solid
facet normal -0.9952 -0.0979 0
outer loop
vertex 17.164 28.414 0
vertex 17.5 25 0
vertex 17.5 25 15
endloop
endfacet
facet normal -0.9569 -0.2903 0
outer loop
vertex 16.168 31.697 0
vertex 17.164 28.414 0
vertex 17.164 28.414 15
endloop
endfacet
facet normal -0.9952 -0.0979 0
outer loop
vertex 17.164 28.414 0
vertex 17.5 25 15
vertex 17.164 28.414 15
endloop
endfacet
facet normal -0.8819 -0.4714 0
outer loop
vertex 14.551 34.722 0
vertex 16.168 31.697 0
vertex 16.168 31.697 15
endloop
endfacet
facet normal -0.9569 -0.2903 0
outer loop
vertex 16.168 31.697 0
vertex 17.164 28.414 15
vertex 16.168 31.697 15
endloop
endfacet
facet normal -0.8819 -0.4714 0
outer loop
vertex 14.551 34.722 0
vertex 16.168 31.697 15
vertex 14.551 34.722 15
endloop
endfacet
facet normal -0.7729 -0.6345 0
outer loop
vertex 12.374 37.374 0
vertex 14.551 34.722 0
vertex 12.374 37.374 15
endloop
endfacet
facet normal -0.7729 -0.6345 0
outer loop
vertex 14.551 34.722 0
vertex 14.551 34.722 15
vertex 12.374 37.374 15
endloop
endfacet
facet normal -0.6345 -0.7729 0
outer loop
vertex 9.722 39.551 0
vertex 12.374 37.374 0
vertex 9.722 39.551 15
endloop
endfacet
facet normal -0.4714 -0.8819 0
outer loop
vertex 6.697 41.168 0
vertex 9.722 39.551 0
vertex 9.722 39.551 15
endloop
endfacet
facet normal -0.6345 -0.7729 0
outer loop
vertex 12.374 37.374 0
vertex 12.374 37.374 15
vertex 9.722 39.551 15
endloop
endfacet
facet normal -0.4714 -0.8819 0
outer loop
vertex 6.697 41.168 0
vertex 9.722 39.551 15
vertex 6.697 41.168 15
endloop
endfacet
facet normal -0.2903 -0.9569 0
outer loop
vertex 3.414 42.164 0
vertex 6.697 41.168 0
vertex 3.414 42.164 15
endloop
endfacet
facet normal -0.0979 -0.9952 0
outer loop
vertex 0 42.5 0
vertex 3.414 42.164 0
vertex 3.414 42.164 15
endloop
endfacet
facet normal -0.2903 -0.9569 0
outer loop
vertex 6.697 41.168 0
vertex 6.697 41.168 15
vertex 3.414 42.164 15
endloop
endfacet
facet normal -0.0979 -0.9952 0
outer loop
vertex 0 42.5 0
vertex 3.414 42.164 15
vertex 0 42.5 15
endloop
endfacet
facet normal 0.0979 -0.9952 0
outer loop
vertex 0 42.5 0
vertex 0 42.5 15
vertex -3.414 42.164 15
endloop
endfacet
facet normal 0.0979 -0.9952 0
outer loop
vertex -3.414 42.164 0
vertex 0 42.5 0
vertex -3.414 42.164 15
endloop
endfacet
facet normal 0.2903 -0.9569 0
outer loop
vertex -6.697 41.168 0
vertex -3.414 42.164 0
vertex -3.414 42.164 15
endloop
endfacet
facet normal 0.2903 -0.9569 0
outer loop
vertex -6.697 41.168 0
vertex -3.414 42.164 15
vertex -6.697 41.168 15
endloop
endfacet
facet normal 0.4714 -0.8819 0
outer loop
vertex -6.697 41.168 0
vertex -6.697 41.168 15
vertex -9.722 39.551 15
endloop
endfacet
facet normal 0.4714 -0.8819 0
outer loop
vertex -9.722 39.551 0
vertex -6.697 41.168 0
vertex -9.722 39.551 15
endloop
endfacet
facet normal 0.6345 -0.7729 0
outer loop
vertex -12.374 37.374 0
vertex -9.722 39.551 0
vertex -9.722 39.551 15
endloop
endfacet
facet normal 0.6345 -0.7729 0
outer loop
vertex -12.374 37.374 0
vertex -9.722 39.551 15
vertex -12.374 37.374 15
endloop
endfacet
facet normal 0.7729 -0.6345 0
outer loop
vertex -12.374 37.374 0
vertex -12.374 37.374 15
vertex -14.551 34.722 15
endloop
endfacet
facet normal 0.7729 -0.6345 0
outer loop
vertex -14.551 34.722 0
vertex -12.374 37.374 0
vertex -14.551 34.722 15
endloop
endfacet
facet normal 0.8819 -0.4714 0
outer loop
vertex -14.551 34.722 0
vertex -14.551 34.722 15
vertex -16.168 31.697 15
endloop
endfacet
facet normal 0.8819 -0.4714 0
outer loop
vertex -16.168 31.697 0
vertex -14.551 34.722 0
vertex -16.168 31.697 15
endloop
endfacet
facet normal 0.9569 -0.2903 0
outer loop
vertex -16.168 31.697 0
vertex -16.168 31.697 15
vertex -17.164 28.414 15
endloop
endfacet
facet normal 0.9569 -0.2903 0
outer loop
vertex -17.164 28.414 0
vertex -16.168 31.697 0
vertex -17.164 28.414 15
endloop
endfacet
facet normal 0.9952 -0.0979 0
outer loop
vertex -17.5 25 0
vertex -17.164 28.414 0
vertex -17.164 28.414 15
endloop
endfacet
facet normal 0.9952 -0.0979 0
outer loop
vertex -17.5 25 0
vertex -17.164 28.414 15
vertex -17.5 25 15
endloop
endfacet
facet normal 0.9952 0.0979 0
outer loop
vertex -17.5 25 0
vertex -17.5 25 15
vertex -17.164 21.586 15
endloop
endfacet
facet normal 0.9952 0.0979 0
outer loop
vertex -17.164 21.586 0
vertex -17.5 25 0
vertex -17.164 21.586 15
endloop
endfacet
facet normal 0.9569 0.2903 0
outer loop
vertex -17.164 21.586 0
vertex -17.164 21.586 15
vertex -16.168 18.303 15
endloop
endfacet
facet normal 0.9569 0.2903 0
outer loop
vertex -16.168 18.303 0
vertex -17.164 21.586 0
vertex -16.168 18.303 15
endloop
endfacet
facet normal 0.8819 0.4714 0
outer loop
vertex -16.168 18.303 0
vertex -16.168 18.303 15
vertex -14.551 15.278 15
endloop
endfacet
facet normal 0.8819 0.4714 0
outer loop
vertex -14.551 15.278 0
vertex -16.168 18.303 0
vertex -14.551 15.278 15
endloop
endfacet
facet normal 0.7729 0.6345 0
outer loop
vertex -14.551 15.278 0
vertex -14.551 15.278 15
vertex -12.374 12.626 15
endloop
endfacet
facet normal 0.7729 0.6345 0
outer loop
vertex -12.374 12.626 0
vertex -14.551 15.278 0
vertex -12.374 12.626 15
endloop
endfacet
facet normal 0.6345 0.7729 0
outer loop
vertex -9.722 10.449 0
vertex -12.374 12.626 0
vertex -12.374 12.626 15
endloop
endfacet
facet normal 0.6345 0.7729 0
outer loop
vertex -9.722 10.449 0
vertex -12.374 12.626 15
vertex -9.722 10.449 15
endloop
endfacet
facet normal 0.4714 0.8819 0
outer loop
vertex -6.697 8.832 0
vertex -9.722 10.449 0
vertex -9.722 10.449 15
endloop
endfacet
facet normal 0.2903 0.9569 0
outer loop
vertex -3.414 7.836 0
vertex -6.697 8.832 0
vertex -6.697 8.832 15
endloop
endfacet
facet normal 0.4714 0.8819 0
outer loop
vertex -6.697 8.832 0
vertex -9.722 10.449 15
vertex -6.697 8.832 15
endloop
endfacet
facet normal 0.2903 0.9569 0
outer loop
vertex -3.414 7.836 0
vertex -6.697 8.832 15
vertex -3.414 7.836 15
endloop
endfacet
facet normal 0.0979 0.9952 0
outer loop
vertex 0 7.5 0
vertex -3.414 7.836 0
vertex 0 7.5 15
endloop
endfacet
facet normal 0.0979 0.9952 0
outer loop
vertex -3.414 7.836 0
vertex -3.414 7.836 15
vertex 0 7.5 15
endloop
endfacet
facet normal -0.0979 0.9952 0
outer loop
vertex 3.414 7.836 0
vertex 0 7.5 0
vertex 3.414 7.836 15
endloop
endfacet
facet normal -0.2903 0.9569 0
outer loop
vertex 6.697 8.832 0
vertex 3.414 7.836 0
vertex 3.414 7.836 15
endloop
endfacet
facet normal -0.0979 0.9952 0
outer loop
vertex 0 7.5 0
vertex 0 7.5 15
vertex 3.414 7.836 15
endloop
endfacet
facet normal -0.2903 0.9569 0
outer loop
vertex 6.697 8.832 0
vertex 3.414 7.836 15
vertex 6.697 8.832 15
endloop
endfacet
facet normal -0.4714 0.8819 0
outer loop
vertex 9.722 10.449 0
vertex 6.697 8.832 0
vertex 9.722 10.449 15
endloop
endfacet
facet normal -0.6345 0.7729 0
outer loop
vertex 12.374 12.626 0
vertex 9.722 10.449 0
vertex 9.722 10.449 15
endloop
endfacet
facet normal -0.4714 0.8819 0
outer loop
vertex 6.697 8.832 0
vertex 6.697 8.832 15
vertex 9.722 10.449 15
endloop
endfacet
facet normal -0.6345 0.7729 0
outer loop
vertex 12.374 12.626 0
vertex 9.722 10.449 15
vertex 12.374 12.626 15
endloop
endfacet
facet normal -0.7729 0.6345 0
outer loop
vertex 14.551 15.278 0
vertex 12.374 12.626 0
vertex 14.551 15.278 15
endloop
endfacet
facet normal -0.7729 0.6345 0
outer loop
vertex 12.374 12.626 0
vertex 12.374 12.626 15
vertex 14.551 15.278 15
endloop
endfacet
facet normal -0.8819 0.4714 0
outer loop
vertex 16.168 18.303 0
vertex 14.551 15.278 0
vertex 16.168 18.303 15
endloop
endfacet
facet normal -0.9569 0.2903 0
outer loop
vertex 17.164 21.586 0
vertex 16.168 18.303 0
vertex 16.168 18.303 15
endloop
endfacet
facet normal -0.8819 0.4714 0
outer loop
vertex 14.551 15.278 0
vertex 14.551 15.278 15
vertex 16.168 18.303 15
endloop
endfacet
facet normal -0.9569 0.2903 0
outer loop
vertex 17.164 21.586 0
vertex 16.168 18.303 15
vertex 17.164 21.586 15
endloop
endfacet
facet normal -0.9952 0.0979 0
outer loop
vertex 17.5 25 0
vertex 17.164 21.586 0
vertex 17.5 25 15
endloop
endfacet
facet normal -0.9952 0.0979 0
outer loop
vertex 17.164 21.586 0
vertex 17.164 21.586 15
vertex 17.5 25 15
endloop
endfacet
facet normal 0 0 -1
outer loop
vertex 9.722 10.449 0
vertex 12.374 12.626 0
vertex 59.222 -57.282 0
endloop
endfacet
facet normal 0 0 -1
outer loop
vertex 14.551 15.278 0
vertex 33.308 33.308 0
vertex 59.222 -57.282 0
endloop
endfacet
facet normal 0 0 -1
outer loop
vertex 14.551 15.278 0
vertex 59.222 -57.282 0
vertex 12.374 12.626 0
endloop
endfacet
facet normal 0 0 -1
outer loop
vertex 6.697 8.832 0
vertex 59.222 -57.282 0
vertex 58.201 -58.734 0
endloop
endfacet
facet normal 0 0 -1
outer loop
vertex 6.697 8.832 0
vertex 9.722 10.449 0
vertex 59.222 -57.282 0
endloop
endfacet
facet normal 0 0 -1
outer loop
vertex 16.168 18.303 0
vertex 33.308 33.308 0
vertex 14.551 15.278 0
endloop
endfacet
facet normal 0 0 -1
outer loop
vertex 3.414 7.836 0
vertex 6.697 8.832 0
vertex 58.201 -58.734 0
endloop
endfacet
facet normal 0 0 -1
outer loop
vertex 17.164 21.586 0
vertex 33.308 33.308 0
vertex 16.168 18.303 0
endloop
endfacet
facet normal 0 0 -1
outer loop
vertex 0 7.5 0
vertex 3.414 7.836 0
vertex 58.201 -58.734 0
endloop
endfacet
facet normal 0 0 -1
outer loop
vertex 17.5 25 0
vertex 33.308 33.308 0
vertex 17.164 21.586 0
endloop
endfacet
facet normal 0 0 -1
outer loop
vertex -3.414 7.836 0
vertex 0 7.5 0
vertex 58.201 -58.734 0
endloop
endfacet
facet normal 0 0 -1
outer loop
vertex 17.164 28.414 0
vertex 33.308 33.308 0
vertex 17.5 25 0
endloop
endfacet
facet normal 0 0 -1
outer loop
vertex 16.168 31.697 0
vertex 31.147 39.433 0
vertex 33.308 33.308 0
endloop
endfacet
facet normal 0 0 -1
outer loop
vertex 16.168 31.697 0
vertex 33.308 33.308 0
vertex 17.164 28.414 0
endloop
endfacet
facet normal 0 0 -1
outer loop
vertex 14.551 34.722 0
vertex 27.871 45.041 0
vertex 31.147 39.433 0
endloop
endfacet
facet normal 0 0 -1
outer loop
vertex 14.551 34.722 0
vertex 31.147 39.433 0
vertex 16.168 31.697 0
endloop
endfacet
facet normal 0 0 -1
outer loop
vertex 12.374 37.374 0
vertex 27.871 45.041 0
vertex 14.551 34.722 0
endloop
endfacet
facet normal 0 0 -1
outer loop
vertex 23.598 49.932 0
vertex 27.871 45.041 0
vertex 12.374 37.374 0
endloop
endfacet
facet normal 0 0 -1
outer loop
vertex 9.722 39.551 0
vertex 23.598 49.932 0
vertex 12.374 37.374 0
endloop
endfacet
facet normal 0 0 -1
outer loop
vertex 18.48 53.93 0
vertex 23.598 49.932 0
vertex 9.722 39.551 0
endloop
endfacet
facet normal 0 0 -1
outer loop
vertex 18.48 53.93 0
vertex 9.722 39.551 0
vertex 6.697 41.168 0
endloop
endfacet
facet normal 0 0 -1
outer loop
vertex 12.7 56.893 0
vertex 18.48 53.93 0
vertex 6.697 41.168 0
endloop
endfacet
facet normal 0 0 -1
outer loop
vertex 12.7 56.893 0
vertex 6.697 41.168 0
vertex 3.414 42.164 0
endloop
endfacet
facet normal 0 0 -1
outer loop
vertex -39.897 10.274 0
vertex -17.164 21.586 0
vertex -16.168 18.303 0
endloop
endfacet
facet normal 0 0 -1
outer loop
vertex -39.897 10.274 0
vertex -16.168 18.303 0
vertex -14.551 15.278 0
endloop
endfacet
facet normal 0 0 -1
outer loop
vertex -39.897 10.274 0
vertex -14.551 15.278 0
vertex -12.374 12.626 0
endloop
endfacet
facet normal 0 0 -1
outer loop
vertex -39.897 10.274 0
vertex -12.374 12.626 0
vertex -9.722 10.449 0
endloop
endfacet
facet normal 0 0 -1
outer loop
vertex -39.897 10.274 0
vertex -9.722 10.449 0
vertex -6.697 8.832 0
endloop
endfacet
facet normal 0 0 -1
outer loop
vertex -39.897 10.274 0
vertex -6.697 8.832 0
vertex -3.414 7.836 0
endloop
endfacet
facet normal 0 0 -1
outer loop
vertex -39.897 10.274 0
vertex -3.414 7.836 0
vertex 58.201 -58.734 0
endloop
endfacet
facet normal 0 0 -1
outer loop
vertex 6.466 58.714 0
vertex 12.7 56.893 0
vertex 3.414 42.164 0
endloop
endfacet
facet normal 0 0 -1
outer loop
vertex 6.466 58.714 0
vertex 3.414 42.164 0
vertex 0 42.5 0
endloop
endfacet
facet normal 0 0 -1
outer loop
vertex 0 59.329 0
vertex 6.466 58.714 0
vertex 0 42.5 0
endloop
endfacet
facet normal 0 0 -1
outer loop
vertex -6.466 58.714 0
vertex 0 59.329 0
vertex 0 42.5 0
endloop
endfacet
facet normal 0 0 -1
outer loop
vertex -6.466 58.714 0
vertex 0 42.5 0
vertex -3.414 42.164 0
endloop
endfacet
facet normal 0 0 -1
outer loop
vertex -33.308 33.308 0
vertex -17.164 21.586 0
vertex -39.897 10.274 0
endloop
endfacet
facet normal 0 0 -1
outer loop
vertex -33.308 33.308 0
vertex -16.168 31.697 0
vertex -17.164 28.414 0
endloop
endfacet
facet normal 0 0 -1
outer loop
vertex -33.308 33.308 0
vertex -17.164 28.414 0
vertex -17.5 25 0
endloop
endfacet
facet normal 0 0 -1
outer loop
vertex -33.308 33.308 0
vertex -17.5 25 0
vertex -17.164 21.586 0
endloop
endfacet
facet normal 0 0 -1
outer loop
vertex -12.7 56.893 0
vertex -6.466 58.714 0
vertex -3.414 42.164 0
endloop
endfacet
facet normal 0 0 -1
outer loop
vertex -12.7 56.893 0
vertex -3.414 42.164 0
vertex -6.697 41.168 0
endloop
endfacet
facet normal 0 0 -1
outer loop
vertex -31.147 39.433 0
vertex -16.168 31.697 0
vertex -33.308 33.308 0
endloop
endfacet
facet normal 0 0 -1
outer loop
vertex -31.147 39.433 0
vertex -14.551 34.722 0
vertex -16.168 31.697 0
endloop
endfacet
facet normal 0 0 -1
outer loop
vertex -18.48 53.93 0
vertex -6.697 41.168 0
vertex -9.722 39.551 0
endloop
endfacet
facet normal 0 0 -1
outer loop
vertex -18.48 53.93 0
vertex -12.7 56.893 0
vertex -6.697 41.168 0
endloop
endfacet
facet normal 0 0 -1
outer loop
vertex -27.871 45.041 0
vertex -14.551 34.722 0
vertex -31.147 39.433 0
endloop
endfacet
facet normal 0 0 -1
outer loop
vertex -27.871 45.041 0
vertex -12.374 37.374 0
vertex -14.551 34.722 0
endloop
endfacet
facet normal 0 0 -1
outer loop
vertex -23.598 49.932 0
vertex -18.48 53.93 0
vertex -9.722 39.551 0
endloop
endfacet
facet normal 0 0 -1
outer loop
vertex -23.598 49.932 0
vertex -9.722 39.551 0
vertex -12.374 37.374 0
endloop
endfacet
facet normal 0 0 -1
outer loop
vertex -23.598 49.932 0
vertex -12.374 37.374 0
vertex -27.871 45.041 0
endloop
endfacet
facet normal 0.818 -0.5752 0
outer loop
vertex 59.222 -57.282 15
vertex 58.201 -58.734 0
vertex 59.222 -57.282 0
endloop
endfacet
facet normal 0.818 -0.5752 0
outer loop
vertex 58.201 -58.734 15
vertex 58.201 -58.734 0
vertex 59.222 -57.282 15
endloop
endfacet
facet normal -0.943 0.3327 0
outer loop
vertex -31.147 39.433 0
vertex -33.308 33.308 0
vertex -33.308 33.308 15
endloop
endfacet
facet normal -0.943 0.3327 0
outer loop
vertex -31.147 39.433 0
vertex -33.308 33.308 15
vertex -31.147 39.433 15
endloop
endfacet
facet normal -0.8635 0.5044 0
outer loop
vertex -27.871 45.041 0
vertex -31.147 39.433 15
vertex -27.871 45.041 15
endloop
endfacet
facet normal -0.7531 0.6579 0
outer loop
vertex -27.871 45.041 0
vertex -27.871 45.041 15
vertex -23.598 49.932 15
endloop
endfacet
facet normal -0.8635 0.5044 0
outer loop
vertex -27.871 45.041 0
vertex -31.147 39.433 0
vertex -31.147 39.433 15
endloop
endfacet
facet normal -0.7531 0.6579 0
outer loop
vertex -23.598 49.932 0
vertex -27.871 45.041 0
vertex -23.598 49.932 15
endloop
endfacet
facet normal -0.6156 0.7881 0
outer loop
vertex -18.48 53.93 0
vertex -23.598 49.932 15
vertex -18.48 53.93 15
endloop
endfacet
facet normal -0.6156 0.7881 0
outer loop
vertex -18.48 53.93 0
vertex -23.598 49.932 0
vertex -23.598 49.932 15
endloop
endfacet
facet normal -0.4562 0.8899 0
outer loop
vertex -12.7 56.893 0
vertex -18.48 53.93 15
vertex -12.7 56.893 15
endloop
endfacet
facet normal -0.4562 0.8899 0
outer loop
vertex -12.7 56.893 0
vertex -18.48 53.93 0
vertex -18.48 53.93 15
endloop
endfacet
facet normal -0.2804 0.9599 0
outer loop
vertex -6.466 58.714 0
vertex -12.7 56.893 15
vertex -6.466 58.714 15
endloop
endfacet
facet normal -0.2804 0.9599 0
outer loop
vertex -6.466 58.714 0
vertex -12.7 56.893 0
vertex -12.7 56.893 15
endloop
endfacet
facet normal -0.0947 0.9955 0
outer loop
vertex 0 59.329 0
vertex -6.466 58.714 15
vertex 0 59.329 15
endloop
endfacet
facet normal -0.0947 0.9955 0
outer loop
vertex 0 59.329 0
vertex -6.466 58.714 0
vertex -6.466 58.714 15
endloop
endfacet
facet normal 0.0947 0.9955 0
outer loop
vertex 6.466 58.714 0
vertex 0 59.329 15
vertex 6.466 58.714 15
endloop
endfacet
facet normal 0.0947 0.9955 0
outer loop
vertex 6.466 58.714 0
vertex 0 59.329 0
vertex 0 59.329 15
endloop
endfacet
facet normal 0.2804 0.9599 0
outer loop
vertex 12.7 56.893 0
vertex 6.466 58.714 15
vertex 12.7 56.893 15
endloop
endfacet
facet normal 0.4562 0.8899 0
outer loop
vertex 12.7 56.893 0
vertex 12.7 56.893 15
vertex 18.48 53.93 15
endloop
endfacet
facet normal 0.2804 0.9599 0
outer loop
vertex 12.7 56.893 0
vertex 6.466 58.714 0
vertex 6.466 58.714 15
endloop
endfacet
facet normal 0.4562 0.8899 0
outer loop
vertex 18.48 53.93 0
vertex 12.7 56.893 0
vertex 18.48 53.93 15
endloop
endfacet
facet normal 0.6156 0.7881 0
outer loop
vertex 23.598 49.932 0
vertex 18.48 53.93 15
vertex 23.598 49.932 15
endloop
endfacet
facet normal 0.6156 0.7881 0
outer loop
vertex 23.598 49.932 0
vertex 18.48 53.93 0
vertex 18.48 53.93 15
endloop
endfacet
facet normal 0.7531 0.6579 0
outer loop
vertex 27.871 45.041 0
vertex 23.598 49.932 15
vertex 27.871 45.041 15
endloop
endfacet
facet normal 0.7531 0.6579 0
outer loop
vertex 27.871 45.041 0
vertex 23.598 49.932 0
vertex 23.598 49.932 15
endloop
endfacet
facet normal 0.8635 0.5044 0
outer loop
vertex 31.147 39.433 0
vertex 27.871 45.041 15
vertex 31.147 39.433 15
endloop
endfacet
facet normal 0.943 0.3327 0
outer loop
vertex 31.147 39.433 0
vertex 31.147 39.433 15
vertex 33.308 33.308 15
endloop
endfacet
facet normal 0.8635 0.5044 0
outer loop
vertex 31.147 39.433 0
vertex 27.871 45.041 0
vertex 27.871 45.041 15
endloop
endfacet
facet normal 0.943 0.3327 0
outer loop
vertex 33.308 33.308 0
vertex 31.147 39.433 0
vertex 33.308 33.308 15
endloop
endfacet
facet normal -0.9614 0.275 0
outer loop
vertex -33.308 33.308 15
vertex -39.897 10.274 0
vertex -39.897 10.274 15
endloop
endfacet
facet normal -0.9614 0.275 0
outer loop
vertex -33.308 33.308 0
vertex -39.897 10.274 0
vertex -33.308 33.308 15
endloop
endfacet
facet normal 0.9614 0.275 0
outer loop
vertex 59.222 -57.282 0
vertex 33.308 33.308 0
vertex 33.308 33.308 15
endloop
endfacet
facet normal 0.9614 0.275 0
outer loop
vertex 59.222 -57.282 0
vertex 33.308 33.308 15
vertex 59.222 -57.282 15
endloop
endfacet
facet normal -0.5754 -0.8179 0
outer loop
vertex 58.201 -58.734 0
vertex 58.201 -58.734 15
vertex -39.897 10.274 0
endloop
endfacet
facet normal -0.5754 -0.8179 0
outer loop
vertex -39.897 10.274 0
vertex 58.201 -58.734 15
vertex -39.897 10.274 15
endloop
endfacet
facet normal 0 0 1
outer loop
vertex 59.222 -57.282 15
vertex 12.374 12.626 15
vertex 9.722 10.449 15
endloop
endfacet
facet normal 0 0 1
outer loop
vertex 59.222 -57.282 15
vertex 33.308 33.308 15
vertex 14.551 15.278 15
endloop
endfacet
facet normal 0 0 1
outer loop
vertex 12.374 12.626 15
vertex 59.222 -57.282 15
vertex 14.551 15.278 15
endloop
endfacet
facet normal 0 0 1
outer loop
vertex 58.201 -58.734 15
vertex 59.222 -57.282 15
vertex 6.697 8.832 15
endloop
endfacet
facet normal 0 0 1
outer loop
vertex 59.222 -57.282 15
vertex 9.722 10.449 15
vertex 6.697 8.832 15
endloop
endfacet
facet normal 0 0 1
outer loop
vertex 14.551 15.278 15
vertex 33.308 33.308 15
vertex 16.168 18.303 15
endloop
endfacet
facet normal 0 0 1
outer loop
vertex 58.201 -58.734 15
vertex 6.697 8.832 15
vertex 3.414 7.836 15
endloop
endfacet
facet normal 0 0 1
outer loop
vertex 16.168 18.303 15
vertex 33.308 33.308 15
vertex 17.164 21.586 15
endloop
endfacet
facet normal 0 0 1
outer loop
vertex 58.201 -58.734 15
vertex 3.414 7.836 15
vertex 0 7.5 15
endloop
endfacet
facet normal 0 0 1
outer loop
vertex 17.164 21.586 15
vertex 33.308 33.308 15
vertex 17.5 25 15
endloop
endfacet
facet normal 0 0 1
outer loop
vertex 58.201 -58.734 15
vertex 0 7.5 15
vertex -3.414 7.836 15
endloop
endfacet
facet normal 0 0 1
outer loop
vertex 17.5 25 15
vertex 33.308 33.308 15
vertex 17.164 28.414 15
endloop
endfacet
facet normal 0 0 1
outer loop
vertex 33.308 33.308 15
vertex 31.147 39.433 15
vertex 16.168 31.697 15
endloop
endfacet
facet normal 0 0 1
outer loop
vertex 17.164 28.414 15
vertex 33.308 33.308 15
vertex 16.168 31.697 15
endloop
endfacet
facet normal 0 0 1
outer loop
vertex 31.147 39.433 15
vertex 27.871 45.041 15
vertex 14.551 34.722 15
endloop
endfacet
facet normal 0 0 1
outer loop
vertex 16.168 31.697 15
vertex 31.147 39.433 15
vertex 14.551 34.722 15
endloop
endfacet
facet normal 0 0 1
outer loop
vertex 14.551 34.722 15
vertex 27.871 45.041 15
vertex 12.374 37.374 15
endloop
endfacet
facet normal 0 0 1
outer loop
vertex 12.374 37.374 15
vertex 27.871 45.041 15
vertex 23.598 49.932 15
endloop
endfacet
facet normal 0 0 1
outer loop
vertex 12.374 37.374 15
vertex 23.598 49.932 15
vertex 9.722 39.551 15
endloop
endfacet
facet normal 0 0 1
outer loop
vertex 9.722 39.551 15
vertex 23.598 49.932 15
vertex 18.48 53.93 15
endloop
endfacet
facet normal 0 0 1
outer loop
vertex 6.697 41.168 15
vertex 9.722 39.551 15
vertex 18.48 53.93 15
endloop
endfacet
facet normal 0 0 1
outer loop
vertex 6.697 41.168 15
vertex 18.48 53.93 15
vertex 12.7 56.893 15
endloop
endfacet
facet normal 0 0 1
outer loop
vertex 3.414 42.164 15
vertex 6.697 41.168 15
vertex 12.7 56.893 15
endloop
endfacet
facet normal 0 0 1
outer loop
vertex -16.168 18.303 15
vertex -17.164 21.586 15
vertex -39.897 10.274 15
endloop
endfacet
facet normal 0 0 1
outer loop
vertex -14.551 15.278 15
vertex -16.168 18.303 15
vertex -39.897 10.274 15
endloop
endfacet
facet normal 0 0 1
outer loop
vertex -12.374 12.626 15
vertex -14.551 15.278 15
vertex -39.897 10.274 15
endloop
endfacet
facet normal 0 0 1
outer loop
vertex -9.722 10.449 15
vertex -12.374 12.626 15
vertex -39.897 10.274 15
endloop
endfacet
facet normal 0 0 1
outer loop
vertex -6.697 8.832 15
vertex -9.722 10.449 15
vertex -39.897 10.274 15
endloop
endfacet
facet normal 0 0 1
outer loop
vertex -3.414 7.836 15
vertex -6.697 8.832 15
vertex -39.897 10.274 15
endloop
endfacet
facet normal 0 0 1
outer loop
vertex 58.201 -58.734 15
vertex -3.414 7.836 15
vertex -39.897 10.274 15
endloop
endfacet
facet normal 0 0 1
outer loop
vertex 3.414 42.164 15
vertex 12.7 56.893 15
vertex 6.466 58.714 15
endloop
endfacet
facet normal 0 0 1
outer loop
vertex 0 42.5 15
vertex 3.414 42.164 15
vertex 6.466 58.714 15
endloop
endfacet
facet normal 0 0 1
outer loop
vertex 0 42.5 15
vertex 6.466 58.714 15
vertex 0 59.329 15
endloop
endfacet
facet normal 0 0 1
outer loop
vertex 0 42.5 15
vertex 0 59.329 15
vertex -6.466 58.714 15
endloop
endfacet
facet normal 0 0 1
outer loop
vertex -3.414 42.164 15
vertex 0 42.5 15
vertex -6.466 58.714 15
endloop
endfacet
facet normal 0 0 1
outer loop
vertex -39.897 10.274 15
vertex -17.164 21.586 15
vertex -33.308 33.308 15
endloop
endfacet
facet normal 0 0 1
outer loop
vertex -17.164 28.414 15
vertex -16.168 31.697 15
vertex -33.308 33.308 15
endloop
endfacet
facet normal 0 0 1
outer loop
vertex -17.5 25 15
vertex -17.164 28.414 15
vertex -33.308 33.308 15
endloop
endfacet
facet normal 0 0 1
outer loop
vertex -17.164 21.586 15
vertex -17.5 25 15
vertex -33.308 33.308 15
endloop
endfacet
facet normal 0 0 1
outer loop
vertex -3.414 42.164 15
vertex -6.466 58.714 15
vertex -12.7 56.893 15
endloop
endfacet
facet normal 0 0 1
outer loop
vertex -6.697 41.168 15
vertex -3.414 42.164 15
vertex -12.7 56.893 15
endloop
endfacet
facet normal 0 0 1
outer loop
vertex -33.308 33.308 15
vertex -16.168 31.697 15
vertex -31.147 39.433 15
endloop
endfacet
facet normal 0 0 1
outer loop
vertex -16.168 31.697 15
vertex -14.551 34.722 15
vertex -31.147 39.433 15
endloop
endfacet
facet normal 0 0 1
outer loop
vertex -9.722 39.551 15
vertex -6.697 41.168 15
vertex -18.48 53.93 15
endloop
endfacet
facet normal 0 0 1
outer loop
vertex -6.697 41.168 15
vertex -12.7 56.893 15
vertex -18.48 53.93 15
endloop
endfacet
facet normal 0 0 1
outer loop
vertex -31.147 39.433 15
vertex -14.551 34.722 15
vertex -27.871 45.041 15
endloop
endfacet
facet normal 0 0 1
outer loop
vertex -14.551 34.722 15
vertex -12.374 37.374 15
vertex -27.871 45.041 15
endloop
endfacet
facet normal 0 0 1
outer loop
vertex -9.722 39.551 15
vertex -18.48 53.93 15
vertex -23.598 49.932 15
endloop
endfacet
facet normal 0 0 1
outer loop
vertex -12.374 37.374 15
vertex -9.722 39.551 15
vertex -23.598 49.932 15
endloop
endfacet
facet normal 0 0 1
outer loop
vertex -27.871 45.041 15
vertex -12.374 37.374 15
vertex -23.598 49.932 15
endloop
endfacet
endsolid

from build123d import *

# Parameters (mm, degrees)
BOSS_EXTRUDE1_DEPTH = 15
SKETCH2_R           = 17.5
CUT_EXTRUDE1_DEPTH  = 87.168439698
CUT_EXTRUDE2_DEPTH  = 15
SKETCH4_W           = 2.2
SKETCH4_H           = 15
CUT_EXTRUDE3_DEPTH  = 10


with BuildPart() as part:
    # Sketch1 → Boss-Extrude1 (new body)
    with BuildSketch(Plane.XY):
        with BuildLine():
            Line((-60, -60), (-33.308172666, 33.308172666))
            ThreePointArc((-33.308172666, 33.308172666), (0, 59.328706637), (33.308172666, 33.308172666))
            Line((33.308172666, 33.308172666), (60, -60))
            Line((60, -60), (-60, -60))
        make_face()
    extrude(amount=BOSS_EXTRUDE1_DEPTH)

    # Sketch2 → Cut-Extrude1 (cut, through all)
    with BuildSketch(Plane.XY.offset(15)):
        with Locations((0, 25)):
            Circle(SKETCH2_R)
    extrude(amount=-CUT_EXTRUDE1_DEPTH, mode=Mode.SUBTRACT)

    # Sketch3 → Cut-Extrude2 (cut)
    with BuildSketch(Plane.XY.offset(15)):
        Polygon((60, -60), (-39.897432064, 10.273715489), (-60, -60), align=None)
    extrude(amount=-CUT_EXTRUDE2_DEPTH, mode=Mode.SUBTRACT)

    # Sketch4 → Cut-Extrude3 (cut)
    with BuildSketch(Plane(origin=(-8.372906684, -11.902485457, 0), x_dir=(0.8179007281921136, -0.5753593649388272, 0), z_dir=(-0.5753593649388272, -0.8179007281921136, 0))):
        with Locations((82.495605588, 7.5)):
            Rectangle(SKETCH4_W, SKETCH4_H)
    extrude(amount=-CUT_EXTRUDE3_DEPTH, mode=Mode.SUBTRACT)


solid = part.part
